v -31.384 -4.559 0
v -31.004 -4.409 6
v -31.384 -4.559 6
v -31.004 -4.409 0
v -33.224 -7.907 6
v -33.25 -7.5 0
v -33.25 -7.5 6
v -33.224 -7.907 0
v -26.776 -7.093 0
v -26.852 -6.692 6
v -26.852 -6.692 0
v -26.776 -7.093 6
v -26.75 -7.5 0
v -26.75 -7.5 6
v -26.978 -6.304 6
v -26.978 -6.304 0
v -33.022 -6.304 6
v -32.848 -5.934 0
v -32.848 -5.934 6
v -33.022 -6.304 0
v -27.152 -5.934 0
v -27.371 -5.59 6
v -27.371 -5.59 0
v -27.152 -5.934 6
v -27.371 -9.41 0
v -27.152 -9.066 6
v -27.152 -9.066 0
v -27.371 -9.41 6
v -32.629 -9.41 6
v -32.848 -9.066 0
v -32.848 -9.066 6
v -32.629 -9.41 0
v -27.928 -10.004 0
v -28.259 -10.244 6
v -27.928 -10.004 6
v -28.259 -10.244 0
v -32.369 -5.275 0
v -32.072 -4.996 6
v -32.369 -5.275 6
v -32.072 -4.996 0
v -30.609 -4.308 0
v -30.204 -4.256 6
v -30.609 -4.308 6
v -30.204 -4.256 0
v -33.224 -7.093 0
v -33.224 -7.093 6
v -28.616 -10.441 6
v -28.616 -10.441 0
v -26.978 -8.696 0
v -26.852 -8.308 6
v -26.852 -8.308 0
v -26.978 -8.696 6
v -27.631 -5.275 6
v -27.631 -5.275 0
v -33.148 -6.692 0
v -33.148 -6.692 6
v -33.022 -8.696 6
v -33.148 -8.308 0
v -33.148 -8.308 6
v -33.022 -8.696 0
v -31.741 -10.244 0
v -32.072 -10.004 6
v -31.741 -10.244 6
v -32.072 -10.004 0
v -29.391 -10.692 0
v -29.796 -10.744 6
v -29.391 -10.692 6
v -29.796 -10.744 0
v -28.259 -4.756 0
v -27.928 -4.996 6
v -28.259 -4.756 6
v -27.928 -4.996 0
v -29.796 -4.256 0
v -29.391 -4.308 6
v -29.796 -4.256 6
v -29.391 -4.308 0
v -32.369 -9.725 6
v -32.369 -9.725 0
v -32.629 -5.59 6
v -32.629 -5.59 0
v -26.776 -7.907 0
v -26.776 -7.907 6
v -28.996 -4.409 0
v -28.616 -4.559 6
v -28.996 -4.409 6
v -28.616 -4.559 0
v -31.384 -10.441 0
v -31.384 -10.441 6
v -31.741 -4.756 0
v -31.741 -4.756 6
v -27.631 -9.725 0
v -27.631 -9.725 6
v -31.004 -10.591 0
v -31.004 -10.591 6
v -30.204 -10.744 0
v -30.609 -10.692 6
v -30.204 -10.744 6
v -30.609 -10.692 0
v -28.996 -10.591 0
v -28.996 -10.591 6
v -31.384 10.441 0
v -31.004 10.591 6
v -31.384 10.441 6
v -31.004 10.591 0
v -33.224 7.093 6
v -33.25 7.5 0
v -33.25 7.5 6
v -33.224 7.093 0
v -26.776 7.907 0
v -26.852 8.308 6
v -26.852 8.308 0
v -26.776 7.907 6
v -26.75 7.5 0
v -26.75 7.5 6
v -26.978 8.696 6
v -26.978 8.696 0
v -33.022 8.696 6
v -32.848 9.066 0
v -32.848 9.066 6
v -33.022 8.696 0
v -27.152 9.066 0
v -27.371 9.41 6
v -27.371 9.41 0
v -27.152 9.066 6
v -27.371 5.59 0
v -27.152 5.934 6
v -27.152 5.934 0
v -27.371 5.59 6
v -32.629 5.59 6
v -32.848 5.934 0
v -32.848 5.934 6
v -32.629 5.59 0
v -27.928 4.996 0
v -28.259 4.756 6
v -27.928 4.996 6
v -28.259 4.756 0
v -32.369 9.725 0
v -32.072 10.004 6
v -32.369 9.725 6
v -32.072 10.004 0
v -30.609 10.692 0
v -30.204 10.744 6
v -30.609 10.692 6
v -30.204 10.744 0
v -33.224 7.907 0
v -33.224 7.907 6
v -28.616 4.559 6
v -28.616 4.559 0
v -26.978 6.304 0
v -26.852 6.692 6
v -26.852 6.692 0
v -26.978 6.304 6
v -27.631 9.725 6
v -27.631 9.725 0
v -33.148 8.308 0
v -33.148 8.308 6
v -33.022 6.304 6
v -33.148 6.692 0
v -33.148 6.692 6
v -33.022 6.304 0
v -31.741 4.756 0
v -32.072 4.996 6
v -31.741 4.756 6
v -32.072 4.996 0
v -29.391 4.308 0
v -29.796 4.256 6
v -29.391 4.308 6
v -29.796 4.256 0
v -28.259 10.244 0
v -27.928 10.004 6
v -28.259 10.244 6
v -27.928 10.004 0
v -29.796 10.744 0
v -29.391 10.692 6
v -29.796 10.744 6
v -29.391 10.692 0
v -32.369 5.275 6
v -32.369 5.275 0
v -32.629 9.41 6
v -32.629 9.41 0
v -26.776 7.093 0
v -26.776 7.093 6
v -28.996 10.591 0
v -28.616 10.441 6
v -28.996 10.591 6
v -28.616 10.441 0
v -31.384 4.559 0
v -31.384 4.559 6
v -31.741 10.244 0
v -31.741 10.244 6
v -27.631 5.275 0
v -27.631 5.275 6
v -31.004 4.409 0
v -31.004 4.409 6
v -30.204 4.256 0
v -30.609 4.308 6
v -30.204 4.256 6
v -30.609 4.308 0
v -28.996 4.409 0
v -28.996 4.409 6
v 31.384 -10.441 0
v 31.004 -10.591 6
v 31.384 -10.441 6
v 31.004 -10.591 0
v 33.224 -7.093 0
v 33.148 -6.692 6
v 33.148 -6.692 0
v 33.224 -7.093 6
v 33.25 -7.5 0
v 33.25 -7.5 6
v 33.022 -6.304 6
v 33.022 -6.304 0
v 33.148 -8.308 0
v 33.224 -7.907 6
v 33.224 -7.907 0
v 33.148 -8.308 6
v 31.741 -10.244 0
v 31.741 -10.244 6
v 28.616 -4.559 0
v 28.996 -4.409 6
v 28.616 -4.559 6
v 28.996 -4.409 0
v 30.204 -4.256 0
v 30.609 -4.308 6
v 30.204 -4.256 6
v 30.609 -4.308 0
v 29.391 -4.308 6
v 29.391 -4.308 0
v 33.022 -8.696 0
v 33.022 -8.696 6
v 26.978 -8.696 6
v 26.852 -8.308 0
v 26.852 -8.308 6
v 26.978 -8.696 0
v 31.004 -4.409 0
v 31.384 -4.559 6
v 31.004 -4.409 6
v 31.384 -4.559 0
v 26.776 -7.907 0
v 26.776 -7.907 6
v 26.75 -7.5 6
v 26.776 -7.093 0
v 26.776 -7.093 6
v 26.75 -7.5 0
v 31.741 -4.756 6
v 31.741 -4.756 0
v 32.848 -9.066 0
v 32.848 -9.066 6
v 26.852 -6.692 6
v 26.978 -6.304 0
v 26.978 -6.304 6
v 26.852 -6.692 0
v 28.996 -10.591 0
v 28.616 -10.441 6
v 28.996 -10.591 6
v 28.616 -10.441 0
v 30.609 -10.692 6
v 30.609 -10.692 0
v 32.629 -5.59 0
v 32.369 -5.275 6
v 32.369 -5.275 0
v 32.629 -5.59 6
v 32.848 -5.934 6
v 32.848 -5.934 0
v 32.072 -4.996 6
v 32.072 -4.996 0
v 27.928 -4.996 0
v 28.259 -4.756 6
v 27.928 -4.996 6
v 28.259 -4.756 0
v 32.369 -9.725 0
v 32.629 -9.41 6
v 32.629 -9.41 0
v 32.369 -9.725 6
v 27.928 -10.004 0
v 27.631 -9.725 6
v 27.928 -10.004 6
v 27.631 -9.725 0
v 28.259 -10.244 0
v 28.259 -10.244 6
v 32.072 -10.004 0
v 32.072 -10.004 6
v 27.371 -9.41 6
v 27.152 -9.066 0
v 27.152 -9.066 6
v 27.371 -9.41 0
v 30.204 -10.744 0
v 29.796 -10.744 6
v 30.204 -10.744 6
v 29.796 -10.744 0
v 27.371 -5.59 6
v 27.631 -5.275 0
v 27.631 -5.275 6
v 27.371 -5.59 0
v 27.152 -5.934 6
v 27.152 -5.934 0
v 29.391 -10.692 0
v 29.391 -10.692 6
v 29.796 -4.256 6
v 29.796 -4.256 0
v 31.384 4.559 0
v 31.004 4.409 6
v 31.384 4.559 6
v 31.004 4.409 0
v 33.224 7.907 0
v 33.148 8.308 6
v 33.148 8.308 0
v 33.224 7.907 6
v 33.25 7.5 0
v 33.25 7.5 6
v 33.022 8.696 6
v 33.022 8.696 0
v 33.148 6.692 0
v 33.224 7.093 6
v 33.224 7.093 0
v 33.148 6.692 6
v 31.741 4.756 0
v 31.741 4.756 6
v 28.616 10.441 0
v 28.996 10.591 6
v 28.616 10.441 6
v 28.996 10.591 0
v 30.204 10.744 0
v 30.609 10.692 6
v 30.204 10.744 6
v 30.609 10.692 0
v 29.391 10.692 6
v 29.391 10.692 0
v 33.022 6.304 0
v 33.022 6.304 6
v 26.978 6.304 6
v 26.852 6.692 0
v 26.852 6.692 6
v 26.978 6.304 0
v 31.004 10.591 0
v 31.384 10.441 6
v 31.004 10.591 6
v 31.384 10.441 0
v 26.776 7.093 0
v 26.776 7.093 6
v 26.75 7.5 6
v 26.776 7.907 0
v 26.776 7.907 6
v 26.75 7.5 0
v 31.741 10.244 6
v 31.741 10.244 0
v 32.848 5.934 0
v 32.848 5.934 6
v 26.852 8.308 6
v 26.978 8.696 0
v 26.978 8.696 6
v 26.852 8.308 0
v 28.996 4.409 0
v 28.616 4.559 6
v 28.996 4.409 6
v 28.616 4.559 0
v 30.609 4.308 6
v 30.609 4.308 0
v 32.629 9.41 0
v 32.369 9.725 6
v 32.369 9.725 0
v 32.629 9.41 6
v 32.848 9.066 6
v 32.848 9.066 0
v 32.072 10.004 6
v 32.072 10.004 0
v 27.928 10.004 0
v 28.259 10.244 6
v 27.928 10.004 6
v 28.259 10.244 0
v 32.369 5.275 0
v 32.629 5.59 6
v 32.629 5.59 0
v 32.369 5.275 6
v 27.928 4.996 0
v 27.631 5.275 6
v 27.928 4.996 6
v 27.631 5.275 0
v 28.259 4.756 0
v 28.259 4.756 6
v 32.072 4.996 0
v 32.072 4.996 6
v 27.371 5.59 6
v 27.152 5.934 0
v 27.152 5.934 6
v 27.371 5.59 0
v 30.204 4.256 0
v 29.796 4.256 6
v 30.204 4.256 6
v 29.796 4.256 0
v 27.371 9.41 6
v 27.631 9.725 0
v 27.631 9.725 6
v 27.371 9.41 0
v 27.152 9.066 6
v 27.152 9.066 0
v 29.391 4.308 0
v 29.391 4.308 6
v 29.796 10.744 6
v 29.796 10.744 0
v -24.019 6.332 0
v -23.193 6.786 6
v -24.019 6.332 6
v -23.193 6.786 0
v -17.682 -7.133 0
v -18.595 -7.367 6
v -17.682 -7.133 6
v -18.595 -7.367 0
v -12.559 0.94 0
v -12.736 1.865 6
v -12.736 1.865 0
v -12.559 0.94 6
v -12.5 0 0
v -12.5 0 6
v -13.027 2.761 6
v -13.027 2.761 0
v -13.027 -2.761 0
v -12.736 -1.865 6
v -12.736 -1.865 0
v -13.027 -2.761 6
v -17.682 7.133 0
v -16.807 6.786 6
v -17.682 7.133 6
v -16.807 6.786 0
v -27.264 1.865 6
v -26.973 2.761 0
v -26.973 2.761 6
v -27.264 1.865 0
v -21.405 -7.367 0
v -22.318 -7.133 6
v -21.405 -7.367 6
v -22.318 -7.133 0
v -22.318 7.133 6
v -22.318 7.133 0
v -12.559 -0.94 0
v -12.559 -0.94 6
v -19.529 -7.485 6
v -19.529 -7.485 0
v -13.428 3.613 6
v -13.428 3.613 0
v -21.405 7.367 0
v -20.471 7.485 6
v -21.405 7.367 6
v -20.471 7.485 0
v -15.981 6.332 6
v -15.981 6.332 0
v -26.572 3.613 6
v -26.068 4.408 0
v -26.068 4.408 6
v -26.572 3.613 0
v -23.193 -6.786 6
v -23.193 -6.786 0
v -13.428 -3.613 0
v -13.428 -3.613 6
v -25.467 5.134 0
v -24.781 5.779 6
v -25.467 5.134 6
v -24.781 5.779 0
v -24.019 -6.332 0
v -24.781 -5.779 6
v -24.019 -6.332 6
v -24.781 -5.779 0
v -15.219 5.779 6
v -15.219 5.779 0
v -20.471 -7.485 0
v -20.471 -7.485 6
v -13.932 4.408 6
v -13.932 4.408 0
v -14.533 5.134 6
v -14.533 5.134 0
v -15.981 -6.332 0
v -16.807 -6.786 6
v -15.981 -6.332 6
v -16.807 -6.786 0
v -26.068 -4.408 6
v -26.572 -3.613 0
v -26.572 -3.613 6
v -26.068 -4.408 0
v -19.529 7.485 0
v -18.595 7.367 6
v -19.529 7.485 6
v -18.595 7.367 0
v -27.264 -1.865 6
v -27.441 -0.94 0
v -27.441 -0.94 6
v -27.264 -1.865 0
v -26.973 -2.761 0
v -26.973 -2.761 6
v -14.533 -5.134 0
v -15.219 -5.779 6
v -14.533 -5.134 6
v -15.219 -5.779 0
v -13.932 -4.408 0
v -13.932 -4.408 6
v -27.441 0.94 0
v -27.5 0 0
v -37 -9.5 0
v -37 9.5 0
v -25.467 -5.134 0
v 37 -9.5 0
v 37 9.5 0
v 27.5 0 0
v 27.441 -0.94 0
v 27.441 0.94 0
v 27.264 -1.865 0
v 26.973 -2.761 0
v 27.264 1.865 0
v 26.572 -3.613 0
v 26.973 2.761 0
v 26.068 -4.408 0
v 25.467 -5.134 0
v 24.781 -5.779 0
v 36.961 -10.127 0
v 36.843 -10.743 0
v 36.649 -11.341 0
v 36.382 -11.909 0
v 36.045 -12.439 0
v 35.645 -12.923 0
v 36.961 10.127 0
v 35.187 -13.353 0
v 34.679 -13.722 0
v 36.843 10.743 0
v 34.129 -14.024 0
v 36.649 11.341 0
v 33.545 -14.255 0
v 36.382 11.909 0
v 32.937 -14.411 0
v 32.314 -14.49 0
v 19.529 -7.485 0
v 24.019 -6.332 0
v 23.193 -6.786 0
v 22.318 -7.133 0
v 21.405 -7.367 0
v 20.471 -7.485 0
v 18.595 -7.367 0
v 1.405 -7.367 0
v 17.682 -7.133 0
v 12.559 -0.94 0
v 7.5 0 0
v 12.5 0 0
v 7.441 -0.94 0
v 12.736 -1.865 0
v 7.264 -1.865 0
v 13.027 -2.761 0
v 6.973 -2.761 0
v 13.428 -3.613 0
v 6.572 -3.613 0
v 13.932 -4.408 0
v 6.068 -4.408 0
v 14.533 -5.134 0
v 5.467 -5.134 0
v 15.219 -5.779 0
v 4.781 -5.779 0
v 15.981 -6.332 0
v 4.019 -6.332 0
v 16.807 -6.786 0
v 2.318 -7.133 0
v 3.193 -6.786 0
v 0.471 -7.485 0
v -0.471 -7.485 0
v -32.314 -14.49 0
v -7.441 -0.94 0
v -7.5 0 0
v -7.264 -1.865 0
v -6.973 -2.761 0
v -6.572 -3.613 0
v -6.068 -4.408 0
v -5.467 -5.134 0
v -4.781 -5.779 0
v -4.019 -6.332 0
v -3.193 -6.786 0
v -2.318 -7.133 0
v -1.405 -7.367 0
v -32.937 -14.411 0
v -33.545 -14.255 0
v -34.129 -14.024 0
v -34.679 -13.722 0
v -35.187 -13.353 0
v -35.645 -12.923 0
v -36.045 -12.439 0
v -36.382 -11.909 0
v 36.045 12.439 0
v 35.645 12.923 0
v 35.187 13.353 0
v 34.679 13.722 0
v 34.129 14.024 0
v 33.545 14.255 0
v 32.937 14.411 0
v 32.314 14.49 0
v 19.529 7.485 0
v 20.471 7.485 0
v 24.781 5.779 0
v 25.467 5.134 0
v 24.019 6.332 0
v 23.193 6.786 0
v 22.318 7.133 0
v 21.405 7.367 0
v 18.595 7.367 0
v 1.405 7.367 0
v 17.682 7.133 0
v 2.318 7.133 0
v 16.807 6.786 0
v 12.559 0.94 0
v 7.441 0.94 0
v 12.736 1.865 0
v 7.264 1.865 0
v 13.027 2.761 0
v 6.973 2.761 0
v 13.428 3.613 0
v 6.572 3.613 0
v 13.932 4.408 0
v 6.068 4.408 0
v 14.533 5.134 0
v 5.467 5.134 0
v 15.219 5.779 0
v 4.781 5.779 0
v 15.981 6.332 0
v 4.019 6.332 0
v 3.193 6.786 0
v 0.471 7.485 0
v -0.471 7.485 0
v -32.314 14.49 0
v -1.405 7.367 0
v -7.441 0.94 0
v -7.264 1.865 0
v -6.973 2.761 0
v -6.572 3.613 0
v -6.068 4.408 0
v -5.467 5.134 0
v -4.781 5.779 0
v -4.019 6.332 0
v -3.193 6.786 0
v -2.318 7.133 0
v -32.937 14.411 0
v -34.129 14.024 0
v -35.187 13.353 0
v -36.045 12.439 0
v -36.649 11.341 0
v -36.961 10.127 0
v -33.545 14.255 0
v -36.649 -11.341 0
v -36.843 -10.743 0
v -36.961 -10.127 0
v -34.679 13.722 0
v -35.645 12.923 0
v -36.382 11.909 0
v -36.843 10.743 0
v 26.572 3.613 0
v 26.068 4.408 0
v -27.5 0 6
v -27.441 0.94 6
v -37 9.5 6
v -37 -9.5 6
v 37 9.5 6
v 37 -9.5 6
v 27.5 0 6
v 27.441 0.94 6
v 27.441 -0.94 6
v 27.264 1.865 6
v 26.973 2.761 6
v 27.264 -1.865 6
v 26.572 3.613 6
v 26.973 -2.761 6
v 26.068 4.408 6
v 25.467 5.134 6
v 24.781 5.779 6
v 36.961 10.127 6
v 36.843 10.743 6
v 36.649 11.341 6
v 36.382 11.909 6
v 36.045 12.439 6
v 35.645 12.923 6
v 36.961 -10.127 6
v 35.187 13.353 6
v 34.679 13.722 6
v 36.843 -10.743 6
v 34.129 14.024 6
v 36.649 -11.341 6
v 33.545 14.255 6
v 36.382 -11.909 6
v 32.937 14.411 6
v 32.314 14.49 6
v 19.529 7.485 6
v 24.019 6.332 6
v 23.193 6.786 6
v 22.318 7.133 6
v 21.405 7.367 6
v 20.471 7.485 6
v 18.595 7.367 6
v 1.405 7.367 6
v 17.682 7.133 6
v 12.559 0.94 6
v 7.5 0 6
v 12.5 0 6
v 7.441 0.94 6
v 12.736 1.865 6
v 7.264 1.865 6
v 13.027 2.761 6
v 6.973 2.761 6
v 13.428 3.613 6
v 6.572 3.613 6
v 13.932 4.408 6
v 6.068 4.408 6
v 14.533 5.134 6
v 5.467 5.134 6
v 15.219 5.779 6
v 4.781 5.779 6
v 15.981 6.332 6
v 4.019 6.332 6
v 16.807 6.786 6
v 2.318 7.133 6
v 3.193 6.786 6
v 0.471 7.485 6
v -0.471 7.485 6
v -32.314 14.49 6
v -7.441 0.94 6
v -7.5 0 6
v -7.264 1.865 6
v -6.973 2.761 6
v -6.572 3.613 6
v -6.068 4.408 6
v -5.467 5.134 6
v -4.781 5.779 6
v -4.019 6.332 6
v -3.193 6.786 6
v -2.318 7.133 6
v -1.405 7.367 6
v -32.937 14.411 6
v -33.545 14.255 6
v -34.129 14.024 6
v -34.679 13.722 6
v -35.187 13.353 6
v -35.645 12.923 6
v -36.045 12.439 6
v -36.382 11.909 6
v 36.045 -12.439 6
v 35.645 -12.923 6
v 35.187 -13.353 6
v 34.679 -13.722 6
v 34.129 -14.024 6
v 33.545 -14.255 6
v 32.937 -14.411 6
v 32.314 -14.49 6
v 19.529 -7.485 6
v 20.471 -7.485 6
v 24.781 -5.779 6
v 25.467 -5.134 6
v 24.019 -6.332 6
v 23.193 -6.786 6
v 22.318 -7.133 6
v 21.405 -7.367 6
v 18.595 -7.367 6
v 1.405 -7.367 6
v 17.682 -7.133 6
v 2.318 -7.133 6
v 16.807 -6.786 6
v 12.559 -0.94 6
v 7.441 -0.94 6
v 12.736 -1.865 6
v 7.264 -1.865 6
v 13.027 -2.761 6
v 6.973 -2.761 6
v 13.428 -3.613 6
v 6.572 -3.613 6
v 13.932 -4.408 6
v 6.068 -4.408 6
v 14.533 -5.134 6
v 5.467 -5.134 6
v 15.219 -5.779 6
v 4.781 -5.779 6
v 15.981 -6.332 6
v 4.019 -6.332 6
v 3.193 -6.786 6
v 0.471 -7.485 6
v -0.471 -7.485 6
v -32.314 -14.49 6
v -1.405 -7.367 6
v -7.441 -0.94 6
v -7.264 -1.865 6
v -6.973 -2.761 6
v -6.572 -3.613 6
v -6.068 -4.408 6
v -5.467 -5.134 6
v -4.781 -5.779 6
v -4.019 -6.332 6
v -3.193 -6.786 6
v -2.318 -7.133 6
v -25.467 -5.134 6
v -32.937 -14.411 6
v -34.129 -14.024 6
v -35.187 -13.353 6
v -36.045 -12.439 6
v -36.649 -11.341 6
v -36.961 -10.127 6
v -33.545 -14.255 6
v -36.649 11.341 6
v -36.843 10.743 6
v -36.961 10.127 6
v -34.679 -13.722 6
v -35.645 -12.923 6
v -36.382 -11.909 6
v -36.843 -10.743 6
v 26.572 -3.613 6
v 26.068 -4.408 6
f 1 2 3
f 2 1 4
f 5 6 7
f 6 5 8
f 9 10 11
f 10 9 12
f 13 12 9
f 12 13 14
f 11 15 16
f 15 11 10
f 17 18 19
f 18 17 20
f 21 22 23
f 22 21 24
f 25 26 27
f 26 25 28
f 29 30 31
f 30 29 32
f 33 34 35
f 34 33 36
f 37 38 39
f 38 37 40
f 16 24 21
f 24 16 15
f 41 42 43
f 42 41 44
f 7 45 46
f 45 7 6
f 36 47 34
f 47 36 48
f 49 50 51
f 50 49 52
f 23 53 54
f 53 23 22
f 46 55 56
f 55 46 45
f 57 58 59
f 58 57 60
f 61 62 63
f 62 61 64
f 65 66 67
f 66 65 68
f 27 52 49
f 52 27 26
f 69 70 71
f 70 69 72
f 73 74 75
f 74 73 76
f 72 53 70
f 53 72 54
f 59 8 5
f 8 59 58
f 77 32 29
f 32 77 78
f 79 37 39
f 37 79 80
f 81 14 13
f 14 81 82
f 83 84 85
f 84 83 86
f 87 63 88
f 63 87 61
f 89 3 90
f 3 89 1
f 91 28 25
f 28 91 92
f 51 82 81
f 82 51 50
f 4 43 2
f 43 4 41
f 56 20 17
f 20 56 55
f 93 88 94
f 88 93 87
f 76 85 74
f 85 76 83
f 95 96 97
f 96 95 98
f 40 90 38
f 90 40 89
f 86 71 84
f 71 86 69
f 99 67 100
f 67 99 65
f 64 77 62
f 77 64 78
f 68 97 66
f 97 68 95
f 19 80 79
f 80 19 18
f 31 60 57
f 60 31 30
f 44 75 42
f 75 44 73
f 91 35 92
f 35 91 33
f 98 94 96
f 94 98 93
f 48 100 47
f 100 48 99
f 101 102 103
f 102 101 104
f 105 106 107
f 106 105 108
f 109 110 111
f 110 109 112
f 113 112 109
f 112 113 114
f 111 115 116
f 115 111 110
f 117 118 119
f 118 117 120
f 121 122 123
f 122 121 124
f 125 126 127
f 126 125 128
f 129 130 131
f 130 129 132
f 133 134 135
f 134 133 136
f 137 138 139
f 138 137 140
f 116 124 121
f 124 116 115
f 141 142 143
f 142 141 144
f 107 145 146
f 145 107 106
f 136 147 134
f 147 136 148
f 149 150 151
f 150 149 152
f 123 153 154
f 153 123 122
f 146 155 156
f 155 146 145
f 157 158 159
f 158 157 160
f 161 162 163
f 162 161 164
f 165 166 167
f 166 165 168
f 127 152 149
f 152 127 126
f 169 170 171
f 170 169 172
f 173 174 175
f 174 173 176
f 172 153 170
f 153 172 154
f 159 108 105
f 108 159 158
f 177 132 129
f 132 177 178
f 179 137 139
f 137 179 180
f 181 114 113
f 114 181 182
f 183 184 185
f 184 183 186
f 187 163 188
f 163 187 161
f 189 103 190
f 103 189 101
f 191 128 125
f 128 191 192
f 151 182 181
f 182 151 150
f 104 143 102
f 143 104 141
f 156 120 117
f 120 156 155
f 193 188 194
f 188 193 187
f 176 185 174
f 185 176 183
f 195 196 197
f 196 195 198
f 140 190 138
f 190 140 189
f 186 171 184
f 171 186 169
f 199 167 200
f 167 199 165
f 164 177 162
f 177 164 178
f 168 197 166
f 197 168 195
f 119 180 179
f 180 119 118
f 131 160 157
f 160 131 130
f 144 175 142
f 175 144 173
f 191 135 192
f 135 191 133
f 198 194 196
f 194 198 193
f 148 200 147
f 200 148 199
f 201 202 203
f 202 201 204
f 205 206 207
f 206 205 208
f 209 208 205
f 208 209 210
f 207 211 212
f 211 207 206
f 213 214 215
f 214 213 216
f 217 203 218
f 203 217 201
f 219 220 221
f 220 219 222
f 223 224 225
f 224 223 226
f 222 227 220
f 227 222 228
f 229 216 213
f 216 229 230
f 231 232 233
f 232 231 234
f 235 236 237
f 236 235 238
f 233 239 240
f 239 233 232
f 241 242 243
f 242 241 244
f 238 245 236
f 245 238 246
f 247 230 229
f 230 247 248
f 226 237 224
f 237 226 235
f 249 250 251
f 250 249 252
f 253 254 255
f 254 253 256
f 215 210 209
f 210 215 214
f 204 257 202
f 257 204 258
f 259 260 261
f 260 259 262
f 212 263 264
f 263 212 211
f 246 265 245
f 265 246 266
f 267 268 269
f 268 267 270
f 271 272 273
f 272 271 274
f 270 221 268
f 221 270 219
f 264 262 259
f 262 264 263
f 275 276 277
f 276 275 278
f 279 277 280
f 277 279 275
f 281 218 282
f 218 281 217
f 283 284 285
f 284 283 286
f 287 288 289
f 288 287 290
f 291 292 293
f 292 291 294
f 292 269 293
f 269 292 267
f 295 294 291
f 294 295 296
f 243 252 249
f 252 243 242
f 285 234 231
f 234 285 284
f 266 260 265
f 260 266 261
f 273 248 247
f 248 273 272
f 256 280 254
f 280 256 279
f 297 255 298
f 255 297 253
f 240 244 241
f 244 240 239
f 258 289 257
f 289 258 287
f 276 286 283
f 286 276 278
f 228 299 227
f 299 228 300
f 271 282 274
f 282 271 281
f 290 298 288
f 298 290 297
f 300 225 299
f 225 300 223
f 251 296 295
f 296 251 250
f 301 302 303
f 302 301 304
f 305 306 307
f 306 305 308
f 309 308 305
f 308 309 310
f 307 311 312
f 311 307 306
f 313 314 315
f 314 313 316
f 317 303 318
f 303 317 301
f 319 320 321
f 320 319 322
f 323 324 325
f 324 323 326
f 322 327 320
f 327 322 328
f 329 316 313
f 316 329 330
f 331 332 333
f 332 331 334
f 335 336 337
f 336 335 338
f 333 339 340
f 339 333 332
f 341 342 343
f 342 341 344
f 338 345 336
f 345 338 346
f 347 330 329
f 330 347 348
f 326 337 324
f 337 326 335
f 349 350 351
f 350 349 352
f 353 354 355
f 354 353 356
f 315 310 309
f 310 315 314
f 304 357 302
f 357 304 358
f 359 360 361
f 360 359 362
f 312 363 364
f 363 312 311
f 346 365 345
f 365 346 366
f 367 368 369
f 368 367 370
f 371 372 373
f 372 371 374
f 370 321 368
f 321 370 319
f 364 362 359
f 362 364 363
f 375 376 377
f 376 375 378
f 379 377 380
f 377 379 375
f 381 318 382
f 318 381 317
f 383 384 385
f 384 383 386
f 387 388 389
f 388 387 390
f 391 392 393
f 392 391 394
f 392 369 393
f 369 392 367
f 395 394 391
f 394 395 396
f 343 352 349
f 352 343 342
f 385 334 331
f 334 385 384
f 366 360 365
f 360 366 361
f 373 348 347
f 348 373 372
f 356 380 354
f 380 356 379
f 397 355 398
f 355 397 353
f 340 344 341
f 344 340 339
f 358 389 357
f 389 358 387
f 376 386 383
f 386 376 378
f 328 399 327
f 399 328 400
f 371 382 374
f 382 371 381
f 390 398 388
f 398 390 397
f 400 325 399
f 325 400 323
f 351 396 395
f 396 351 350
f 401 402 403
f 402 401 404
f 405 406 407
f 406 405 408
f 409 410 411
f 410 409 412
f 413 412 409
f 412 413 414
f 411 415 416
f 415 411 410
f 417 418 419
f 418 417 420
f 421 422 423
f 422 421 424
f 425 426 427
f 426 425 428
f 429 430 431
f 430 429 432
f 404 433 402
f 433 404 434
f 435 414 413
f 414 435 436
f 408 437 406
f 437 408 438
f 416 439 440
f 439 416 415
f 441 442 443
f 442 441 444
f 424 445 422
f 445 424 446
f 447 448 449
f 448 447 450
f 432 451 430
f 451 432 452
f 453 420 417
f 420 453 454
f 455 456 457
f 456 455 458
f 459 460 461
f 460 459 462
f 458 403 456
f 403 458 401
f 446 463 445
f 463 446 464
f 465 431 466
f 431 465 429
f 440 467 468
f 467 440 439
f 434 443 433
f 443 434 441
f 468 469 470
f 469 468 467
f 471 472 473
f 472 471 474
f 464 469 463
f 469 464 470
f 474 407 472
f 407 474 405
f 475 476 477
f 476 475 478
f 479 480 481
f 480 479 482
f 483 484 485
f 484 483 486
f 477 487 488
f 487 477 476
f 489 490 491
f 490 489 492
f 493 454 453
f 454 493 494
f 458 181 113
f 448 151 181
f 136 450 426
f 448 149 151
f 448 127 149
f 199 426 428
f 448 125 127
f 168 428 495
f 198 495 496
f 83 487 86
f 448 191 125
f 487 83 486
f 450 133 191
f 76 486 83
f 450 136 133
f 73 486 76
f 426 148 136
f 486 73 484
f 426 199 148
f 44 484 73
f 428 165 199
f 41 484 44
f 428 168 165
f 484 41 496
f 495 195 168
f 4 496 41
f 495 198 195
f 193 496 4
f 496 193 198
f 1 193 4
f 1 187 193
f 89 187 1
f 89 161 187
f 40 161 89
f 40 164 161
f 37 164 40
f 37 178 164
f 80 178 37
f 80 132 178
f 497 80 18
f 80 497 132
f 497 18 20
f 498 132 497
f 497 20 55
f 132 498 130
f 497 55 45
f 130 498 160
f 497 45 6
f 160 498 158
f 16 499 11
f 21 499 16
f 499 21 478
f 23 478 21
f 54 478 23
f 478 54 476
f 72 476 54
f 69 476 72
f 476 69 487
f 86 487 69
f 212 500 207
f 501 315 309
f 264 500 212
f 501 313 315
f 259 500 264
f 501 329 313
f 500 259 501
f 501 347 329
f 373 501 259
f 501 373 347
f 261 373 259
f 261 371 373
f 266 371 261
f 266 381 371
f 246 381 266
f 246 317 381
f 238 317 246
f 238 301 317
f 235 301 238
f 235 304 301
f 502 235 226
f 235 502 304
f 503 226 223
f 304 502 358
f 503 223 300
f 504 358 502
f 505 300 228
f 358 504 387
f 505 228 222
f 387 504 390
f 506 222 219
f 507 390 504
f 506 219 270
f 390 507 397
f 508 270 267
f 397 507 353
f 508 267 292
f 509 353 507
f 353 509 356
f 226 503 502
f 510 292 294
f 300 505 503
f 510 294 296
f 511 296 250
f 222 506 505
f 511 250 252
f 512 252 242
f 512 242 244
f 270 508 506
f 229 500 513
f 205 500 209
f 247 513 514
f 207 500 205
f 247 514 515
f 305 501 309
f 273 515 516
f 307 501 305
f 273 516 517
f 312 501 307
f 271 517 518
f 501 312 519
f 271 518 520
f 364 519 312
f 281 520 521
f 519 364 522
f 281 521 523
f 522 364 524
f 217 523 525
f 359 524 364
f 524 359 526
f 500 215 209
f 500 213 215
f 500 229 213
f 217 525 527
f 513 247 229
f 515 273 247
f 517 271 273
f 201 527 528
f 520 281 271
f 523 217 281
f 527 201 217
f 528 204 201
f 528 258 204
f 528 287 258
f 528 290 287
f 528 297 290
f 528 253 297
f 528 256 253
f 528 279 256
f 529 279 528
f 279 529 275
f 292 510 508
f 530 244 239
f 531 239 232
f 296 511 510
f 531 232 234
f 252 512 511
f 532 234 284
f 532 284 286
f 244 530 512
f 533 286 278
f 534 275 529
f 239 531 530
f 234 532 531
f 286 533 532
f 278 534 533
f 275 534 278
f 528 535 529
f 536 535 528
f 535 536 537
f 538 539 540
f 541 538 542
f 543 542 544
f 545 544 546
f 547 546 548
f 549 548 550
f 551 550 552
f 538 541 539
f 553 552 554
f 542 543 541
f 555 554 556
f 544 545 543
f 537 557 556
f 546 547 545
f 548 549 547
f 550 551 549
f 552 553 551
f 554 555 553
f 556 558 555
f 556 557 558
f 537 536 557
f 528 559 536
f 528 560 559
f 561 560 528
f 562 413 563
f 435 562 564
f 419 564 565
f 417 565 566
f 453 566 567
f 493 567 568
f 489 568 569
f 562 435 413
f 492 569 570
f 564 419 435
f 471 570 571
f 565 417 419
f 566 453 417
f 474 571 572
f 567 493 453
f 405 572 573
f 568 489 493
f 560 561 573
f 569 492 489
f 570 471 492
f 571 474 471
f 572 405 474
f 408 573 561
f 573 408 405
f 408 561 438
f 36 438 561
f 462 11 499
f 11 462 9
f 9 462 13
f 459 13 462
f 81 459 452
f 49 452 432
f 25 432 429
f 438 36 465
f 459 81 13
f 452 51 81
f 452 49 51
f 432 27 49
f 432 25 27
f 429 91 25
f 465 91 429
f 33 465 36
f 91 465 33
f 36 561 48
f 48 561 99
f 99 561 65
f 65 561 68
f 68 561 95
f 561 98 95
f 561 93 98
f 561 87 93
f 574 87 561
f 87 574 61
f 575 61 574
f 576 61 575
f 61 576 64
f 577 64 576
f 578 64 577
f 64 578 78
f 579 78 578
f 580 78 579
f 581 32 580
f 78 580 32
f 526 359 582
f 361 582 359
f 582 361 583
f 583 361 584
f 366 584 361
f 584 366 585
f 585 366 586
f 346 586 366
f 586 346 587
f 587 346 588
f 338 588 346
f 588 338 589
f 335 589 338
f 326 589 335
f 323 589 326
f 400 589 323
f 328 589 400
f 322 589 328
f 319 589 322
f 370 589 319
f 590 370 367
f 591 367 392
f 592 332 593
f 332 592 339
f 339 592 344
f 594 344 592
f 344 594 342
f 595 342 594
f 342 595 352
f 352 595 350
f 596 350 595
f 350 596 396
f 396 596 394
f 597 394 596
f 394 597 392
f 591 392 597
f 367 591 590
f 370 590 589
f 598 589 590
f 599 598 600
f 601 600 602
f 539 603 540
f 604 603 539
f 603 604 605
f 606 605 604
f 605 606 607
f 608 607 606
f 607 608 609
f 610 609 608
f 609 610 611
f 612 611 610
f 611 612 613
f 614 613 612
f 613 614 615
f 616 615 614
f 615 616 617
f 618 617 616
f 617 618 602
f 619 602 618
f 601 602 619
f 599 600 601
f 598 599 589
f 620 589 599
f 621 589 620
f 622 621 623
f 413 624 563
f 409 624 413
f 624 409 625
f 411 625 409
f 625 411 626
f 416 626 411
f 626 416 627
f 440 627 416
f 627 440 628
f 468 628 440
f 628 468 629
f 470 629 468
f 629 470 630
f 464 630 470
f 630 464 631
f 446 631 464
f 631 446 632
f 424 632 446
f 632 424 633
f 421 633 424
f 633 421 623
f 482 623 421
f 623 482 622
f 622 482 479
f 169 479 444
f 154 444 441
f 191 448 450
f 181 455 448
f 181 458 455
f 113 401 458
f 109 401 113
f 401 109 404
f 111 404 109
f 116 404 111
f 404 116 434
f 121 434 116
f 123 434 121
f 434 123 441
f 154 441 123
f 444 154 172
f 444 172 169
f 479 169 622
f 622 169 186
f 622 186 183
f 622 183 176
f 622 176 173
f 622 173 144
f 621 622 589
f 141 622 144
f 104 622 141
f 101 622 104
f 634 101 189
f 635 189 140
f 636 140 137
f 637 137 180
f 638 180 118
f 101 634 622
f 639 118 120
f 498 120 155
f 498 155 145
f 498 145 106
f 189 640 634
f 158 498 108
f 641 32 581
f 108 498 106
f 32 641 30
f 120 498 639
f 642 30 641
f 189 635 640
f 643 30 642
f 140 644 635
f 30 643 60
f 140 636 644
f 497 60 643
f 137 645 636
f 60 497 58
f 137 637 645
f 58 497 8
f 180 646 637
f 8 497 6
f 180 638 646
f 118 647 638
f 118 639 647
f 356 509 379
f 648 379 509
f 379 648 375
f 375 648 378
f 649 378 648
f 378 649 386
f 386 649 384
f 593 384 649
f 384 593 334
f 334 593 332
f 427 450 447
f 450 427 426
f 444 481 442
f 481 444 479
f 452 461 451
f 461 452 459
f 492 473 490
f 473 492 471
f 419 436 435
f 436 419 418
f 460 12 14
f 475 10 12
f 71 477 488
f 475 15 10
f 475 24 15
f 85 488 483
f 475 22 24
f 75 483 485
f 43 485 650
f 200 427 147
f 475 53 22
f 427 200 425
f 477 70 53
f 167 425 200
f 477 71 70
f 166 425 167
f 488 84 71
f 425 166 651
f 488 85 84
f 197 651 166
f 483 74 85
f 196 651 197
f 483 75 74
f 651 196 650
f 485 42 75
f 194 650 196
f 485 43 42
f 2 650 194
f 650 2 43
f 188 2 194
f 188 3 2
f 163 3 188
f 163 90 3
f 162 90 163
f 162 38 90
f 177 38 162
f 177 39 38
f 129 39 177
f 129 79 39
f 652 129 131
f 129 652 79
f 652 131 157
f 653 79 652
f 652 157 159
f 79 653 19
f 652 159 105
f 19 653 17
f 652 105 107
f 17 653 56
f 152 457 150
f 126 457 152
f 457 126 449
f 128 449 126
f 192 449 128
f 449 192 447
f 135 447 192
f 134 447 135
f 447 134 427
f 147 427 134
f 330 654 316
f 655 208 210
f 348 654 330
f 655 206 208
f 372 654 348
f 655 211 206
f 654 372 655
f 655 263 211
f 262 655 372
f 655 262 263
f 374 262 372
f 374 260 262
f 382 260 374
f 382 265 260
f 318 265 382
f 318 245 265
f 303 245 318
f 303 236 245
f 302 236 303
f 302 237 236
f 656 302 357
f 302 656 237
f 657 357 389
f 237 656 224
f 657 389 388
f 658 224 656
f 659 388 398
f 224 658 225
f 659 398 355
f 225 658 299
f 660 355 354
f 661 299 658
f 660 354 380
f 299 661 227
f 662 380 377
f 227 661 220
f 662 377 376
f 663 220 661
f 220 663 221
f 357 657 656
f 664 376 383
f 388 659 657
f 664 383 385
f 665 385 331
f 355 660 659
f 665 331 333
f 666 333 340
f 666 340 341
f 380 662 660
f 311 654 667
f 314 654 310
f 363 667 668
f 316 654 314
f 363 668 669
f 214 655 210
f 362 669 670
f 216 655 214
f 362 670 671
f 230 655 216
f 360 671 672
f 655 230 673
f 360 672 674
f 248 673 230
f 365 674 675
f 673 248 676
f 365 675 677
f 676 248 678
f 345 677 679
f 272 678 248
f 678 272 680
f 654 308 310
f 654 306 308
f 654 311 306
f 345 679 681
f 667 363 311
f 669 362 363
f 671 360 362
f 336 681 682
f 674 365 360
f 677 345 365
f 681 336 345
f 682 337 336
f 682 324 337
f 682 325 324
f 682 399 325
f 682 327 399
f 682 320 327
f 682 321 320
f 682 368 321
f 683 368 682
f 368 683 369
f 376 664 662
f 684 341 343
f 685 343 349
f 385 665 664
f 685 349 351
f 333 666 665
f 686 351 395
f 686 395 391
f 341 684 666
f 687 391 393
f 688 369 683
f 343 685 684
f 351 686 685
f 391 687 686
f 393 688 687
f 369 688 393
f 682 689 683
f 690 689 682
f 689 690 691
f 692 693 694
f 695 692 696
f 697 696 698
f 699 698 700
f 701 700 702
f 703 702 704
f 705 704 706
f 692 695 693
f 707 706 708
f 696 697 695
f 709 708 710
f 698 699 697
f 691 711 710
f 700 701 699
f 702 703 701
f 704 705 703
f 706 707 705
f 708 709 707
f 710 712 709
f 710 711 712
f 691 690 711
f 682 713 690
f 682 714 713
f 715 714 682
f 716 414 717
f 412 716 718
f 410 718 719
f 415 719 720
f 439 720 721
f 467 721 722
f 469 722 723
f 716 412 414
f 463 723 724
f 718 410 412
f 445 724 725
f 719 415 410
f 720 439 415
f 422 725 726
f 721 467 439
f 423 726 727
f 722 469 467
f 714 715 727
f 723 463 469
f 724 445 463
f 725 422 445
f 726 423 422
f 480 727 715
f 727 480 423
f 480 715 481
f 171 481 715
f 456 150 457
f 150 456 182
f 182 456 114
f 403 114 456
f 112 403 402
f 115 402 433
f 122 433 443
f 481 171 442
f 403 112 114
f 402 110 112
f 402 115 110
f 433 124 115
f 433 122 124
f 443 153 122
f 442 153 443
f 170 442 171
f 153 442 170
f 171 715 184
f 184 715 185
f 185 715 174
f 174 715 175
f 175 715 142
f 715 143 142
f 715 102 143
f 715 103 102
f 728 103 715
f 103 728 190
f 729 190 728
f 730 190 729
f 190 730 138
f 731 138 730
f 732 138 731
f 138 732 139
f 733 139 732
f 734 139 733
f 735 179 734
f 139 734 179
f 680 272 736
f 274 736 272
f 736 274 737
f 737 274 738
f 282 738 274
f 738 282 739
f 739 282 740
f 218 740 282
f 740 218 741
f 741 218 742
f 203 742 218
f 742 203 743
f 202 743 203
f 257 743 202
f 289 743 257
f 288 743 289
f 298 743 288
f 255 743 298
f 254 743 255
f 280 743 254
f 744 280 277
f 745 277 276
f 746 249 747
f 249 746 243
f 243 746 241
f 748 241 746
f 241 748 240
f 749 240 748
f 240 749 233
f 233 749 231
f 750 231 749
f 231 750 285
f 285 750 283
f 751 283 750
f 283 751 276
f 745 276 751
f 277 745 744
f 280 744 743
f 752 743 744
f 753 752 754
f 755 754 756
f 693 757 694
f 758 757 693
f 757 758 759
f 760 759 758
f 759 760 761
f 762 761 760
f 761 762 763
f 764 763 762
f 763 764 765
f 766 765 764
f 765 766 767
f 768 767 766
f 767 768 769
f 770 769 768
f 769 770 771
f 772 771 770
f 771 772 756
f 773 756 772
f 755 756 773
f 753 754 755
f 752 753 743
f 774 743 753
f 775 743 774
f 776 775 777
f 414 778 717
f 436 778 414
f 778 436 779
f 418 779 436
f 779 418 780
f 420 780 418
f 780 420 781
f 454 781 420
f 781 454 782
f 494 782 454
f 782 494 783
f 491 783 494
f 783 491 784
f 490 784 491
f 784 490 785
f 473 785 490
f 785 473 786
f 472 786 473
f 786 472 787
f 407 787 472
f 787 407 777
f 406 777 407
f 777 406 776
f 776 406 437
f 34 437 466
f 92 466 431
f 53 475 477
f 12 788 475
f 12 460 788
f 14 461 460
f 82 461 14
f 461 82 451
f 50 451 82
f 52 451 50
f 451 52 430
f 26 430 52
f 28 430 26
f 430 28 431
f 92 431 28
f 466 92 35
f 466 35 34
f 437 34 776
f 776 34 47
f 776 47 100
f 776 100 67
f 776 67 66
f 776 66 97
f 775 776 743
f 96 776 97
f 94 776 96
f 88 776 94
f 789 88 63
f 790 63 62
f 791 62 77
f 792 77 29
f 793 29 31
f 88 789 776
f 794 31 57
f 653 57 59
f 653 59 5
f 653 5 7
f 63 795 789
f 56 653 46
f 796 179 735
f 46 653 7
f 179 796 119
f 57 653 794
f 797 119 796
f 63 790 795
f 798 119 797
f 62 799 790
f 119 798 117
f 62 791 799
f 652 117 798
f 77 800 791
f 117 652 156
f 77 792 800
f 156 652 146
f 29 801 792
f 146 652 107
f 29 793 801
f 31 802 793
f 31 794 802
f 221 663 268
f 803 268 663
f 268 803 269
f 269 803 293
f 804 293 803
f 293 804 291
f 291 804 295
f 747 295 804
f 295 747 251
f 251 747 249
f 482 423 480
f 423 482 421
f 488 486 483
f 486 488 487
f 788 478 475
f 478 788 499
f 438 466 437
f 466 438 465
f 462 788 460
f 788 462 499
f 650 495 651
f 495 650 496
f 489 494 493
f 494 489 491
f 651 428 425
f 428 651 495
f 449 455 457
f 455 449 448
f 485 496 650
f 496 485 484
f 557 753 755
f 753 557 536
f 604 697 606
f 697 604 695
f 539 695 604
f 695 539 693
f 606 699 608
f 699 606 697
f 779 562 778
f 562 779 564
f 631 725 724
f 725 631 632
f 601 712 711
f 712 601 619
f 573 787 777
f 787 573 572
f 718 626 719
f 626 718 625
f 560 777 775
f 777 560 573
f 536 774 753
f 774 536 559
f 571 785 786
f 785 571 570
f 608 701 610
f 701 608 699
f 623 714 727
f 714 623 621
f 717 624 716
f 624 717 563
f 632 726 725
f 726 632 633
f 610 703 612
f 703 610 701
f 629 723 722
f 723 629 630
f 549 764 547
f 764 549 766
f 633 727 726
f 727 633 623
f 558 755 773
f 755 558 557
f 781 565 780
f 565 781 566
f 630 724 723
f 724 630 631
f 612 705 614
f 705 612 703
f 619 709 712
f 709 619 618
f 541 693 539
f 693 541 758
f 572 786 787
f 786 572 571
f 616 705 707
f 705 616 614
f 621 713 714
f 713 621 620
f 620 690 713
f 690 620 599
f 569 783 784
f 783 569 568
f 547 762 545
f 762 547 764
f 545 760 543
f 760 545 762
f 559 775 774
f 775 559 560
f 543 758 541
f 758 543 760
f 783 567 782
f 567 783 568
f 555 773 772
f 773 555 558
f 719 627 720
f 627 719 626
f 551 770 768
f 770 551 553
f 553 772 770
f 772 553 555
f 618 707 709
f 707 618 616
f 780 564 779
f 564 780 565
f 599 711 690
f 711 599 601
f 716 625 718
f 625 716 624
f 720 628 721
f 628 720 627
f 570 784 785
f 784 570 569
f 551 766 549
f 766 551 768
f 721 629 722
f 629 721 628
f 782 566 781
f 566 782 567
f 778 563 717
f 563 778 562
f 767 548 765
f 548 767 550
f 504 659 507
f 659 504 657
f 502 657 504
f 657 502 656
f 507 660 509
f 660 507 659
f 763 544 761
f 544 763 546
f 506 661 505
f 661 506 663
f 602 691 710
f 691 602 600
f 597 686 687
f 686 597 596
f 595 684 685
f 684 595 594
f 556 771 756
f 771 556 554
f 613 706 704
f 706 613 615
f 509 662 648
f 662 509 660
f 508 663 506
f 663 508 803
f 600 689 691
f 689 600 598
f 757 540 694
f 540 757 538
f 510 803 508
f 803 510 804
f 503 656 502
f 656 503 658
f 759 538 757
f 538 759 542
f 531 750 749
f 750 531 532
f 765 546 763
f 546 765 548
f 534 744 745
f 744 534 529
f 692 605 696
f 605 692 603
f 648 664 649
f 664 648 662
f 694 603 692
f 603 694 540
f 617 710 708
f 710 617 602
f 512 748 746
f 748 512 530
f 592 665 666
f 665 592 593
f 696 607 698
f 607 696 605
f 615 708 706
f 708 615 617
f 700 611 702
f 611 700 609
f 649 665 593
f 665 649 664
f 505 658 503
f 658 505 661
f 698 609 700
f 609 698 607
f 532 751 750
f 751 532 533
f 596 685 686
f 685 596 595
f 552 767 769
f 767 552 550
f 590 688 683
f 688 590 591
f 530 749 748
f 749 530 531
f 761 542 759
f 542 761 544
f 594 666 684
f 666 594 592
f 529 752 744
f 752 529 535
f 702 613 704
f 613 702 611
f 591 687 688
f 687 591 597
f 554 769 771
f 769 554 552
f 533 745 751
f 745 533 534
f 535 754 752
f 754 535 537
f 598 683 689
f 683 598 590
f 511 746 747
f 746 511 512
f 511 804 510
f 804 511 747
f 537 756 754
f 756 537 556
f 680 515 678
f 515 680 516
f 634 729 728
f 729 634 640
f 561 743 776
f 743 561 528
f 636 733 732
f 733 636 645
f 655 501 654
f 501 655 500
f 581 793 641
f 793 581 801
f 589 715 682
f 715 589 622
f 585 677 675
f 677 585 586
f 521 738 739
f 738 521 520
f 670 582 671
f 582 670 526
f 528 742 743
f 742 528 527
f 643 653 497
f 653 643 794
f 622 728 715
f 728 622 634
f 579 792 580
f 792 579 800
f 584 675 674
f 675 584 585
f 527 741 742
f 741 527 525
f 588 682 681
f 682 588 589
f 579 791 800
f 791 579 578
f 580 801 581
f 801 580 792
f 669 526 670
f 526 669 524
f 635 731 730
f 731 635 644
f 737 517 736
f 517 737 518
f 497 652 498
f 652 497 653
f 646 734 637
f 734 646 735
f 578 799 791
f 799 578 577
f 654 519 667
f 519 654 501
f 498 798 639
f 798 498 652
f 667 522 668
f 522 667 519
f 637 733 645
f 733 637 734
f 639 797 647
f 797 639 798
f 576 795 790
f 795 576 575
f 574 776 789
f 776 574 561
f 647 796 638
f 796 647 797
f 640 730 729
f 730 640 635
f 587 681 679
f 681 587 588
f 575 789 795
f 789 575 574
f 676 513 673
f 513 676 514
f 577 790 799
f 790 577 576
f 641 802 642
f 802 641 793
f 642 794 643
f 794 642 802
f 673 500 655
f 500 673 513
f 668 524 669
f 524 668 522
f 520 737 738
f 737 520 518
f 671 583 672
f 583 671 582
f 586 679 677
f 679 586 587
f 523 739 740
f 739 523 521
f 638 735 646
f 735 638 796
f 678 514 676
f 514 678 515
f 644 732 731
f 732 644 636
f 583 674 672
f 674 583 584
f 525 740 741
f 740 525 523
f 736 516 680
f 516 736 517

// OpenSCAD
$fn = 50;

difference() {
	union() {
		hull() {
			translate(v = [-32.0, 9.5, 0]) {
				cylinder(h = 6, r = 5);
			}
			translate(v = [32.0, 9.5, 0]) {
				cylinder(h = 6, r = 5);
			}
			translate(v = [-32.0, -9.5, 0]) {
				cylinder(h = 6, r = 5);
			}
			translate(v = [32.0, -9.5, 0]) {
				cylinder(h = 6, r = 5);
			}
		}
	}
	union() {
		translate(v = [-30.0, -7.5, -100.0]) {
			cylinder(h = 200, r = 3.25);
		}
		translate(v = [-30.0, 7.5, -100.0]) {
			cylinder(h = 200, r = 3.25);
		}
		translate(v = [30.0, -7.5, -100.0]) {
			cylinder(h = 200, r = 3.25);
		}
		translate(v = [30.0, 7.5, -100.0]) {
			cylinder(h = 200, r = 3.25);
		}
		translate(v = [-30.0, -7.5, -100.0]) {
			cylinder(h = 200, r = 1.8);
		}
		translate(v = [-30.0, 7.5, -100.0]) {
			cylinder(h = 200, r = 1.8);
		}
		translate(v = [30.0, -7.5, -100.0]) {
			cylinder(h = 200, r = 1.8);
		}
		translate(v = [30.0, 7.5, -100.0]) {
			cylinder(h = 200, r = 1.8);
		}
		translate(v = [-20.0, 0, 0.0]) {
			cylinder(h = 6, r = 7.5);
		}
		cylinder(h = 6, r = 7.5);
		translate(v = [20.0, 0, 0.0]) {
			cylinder(h = 6, r = 7.5);
		}
	}
}
